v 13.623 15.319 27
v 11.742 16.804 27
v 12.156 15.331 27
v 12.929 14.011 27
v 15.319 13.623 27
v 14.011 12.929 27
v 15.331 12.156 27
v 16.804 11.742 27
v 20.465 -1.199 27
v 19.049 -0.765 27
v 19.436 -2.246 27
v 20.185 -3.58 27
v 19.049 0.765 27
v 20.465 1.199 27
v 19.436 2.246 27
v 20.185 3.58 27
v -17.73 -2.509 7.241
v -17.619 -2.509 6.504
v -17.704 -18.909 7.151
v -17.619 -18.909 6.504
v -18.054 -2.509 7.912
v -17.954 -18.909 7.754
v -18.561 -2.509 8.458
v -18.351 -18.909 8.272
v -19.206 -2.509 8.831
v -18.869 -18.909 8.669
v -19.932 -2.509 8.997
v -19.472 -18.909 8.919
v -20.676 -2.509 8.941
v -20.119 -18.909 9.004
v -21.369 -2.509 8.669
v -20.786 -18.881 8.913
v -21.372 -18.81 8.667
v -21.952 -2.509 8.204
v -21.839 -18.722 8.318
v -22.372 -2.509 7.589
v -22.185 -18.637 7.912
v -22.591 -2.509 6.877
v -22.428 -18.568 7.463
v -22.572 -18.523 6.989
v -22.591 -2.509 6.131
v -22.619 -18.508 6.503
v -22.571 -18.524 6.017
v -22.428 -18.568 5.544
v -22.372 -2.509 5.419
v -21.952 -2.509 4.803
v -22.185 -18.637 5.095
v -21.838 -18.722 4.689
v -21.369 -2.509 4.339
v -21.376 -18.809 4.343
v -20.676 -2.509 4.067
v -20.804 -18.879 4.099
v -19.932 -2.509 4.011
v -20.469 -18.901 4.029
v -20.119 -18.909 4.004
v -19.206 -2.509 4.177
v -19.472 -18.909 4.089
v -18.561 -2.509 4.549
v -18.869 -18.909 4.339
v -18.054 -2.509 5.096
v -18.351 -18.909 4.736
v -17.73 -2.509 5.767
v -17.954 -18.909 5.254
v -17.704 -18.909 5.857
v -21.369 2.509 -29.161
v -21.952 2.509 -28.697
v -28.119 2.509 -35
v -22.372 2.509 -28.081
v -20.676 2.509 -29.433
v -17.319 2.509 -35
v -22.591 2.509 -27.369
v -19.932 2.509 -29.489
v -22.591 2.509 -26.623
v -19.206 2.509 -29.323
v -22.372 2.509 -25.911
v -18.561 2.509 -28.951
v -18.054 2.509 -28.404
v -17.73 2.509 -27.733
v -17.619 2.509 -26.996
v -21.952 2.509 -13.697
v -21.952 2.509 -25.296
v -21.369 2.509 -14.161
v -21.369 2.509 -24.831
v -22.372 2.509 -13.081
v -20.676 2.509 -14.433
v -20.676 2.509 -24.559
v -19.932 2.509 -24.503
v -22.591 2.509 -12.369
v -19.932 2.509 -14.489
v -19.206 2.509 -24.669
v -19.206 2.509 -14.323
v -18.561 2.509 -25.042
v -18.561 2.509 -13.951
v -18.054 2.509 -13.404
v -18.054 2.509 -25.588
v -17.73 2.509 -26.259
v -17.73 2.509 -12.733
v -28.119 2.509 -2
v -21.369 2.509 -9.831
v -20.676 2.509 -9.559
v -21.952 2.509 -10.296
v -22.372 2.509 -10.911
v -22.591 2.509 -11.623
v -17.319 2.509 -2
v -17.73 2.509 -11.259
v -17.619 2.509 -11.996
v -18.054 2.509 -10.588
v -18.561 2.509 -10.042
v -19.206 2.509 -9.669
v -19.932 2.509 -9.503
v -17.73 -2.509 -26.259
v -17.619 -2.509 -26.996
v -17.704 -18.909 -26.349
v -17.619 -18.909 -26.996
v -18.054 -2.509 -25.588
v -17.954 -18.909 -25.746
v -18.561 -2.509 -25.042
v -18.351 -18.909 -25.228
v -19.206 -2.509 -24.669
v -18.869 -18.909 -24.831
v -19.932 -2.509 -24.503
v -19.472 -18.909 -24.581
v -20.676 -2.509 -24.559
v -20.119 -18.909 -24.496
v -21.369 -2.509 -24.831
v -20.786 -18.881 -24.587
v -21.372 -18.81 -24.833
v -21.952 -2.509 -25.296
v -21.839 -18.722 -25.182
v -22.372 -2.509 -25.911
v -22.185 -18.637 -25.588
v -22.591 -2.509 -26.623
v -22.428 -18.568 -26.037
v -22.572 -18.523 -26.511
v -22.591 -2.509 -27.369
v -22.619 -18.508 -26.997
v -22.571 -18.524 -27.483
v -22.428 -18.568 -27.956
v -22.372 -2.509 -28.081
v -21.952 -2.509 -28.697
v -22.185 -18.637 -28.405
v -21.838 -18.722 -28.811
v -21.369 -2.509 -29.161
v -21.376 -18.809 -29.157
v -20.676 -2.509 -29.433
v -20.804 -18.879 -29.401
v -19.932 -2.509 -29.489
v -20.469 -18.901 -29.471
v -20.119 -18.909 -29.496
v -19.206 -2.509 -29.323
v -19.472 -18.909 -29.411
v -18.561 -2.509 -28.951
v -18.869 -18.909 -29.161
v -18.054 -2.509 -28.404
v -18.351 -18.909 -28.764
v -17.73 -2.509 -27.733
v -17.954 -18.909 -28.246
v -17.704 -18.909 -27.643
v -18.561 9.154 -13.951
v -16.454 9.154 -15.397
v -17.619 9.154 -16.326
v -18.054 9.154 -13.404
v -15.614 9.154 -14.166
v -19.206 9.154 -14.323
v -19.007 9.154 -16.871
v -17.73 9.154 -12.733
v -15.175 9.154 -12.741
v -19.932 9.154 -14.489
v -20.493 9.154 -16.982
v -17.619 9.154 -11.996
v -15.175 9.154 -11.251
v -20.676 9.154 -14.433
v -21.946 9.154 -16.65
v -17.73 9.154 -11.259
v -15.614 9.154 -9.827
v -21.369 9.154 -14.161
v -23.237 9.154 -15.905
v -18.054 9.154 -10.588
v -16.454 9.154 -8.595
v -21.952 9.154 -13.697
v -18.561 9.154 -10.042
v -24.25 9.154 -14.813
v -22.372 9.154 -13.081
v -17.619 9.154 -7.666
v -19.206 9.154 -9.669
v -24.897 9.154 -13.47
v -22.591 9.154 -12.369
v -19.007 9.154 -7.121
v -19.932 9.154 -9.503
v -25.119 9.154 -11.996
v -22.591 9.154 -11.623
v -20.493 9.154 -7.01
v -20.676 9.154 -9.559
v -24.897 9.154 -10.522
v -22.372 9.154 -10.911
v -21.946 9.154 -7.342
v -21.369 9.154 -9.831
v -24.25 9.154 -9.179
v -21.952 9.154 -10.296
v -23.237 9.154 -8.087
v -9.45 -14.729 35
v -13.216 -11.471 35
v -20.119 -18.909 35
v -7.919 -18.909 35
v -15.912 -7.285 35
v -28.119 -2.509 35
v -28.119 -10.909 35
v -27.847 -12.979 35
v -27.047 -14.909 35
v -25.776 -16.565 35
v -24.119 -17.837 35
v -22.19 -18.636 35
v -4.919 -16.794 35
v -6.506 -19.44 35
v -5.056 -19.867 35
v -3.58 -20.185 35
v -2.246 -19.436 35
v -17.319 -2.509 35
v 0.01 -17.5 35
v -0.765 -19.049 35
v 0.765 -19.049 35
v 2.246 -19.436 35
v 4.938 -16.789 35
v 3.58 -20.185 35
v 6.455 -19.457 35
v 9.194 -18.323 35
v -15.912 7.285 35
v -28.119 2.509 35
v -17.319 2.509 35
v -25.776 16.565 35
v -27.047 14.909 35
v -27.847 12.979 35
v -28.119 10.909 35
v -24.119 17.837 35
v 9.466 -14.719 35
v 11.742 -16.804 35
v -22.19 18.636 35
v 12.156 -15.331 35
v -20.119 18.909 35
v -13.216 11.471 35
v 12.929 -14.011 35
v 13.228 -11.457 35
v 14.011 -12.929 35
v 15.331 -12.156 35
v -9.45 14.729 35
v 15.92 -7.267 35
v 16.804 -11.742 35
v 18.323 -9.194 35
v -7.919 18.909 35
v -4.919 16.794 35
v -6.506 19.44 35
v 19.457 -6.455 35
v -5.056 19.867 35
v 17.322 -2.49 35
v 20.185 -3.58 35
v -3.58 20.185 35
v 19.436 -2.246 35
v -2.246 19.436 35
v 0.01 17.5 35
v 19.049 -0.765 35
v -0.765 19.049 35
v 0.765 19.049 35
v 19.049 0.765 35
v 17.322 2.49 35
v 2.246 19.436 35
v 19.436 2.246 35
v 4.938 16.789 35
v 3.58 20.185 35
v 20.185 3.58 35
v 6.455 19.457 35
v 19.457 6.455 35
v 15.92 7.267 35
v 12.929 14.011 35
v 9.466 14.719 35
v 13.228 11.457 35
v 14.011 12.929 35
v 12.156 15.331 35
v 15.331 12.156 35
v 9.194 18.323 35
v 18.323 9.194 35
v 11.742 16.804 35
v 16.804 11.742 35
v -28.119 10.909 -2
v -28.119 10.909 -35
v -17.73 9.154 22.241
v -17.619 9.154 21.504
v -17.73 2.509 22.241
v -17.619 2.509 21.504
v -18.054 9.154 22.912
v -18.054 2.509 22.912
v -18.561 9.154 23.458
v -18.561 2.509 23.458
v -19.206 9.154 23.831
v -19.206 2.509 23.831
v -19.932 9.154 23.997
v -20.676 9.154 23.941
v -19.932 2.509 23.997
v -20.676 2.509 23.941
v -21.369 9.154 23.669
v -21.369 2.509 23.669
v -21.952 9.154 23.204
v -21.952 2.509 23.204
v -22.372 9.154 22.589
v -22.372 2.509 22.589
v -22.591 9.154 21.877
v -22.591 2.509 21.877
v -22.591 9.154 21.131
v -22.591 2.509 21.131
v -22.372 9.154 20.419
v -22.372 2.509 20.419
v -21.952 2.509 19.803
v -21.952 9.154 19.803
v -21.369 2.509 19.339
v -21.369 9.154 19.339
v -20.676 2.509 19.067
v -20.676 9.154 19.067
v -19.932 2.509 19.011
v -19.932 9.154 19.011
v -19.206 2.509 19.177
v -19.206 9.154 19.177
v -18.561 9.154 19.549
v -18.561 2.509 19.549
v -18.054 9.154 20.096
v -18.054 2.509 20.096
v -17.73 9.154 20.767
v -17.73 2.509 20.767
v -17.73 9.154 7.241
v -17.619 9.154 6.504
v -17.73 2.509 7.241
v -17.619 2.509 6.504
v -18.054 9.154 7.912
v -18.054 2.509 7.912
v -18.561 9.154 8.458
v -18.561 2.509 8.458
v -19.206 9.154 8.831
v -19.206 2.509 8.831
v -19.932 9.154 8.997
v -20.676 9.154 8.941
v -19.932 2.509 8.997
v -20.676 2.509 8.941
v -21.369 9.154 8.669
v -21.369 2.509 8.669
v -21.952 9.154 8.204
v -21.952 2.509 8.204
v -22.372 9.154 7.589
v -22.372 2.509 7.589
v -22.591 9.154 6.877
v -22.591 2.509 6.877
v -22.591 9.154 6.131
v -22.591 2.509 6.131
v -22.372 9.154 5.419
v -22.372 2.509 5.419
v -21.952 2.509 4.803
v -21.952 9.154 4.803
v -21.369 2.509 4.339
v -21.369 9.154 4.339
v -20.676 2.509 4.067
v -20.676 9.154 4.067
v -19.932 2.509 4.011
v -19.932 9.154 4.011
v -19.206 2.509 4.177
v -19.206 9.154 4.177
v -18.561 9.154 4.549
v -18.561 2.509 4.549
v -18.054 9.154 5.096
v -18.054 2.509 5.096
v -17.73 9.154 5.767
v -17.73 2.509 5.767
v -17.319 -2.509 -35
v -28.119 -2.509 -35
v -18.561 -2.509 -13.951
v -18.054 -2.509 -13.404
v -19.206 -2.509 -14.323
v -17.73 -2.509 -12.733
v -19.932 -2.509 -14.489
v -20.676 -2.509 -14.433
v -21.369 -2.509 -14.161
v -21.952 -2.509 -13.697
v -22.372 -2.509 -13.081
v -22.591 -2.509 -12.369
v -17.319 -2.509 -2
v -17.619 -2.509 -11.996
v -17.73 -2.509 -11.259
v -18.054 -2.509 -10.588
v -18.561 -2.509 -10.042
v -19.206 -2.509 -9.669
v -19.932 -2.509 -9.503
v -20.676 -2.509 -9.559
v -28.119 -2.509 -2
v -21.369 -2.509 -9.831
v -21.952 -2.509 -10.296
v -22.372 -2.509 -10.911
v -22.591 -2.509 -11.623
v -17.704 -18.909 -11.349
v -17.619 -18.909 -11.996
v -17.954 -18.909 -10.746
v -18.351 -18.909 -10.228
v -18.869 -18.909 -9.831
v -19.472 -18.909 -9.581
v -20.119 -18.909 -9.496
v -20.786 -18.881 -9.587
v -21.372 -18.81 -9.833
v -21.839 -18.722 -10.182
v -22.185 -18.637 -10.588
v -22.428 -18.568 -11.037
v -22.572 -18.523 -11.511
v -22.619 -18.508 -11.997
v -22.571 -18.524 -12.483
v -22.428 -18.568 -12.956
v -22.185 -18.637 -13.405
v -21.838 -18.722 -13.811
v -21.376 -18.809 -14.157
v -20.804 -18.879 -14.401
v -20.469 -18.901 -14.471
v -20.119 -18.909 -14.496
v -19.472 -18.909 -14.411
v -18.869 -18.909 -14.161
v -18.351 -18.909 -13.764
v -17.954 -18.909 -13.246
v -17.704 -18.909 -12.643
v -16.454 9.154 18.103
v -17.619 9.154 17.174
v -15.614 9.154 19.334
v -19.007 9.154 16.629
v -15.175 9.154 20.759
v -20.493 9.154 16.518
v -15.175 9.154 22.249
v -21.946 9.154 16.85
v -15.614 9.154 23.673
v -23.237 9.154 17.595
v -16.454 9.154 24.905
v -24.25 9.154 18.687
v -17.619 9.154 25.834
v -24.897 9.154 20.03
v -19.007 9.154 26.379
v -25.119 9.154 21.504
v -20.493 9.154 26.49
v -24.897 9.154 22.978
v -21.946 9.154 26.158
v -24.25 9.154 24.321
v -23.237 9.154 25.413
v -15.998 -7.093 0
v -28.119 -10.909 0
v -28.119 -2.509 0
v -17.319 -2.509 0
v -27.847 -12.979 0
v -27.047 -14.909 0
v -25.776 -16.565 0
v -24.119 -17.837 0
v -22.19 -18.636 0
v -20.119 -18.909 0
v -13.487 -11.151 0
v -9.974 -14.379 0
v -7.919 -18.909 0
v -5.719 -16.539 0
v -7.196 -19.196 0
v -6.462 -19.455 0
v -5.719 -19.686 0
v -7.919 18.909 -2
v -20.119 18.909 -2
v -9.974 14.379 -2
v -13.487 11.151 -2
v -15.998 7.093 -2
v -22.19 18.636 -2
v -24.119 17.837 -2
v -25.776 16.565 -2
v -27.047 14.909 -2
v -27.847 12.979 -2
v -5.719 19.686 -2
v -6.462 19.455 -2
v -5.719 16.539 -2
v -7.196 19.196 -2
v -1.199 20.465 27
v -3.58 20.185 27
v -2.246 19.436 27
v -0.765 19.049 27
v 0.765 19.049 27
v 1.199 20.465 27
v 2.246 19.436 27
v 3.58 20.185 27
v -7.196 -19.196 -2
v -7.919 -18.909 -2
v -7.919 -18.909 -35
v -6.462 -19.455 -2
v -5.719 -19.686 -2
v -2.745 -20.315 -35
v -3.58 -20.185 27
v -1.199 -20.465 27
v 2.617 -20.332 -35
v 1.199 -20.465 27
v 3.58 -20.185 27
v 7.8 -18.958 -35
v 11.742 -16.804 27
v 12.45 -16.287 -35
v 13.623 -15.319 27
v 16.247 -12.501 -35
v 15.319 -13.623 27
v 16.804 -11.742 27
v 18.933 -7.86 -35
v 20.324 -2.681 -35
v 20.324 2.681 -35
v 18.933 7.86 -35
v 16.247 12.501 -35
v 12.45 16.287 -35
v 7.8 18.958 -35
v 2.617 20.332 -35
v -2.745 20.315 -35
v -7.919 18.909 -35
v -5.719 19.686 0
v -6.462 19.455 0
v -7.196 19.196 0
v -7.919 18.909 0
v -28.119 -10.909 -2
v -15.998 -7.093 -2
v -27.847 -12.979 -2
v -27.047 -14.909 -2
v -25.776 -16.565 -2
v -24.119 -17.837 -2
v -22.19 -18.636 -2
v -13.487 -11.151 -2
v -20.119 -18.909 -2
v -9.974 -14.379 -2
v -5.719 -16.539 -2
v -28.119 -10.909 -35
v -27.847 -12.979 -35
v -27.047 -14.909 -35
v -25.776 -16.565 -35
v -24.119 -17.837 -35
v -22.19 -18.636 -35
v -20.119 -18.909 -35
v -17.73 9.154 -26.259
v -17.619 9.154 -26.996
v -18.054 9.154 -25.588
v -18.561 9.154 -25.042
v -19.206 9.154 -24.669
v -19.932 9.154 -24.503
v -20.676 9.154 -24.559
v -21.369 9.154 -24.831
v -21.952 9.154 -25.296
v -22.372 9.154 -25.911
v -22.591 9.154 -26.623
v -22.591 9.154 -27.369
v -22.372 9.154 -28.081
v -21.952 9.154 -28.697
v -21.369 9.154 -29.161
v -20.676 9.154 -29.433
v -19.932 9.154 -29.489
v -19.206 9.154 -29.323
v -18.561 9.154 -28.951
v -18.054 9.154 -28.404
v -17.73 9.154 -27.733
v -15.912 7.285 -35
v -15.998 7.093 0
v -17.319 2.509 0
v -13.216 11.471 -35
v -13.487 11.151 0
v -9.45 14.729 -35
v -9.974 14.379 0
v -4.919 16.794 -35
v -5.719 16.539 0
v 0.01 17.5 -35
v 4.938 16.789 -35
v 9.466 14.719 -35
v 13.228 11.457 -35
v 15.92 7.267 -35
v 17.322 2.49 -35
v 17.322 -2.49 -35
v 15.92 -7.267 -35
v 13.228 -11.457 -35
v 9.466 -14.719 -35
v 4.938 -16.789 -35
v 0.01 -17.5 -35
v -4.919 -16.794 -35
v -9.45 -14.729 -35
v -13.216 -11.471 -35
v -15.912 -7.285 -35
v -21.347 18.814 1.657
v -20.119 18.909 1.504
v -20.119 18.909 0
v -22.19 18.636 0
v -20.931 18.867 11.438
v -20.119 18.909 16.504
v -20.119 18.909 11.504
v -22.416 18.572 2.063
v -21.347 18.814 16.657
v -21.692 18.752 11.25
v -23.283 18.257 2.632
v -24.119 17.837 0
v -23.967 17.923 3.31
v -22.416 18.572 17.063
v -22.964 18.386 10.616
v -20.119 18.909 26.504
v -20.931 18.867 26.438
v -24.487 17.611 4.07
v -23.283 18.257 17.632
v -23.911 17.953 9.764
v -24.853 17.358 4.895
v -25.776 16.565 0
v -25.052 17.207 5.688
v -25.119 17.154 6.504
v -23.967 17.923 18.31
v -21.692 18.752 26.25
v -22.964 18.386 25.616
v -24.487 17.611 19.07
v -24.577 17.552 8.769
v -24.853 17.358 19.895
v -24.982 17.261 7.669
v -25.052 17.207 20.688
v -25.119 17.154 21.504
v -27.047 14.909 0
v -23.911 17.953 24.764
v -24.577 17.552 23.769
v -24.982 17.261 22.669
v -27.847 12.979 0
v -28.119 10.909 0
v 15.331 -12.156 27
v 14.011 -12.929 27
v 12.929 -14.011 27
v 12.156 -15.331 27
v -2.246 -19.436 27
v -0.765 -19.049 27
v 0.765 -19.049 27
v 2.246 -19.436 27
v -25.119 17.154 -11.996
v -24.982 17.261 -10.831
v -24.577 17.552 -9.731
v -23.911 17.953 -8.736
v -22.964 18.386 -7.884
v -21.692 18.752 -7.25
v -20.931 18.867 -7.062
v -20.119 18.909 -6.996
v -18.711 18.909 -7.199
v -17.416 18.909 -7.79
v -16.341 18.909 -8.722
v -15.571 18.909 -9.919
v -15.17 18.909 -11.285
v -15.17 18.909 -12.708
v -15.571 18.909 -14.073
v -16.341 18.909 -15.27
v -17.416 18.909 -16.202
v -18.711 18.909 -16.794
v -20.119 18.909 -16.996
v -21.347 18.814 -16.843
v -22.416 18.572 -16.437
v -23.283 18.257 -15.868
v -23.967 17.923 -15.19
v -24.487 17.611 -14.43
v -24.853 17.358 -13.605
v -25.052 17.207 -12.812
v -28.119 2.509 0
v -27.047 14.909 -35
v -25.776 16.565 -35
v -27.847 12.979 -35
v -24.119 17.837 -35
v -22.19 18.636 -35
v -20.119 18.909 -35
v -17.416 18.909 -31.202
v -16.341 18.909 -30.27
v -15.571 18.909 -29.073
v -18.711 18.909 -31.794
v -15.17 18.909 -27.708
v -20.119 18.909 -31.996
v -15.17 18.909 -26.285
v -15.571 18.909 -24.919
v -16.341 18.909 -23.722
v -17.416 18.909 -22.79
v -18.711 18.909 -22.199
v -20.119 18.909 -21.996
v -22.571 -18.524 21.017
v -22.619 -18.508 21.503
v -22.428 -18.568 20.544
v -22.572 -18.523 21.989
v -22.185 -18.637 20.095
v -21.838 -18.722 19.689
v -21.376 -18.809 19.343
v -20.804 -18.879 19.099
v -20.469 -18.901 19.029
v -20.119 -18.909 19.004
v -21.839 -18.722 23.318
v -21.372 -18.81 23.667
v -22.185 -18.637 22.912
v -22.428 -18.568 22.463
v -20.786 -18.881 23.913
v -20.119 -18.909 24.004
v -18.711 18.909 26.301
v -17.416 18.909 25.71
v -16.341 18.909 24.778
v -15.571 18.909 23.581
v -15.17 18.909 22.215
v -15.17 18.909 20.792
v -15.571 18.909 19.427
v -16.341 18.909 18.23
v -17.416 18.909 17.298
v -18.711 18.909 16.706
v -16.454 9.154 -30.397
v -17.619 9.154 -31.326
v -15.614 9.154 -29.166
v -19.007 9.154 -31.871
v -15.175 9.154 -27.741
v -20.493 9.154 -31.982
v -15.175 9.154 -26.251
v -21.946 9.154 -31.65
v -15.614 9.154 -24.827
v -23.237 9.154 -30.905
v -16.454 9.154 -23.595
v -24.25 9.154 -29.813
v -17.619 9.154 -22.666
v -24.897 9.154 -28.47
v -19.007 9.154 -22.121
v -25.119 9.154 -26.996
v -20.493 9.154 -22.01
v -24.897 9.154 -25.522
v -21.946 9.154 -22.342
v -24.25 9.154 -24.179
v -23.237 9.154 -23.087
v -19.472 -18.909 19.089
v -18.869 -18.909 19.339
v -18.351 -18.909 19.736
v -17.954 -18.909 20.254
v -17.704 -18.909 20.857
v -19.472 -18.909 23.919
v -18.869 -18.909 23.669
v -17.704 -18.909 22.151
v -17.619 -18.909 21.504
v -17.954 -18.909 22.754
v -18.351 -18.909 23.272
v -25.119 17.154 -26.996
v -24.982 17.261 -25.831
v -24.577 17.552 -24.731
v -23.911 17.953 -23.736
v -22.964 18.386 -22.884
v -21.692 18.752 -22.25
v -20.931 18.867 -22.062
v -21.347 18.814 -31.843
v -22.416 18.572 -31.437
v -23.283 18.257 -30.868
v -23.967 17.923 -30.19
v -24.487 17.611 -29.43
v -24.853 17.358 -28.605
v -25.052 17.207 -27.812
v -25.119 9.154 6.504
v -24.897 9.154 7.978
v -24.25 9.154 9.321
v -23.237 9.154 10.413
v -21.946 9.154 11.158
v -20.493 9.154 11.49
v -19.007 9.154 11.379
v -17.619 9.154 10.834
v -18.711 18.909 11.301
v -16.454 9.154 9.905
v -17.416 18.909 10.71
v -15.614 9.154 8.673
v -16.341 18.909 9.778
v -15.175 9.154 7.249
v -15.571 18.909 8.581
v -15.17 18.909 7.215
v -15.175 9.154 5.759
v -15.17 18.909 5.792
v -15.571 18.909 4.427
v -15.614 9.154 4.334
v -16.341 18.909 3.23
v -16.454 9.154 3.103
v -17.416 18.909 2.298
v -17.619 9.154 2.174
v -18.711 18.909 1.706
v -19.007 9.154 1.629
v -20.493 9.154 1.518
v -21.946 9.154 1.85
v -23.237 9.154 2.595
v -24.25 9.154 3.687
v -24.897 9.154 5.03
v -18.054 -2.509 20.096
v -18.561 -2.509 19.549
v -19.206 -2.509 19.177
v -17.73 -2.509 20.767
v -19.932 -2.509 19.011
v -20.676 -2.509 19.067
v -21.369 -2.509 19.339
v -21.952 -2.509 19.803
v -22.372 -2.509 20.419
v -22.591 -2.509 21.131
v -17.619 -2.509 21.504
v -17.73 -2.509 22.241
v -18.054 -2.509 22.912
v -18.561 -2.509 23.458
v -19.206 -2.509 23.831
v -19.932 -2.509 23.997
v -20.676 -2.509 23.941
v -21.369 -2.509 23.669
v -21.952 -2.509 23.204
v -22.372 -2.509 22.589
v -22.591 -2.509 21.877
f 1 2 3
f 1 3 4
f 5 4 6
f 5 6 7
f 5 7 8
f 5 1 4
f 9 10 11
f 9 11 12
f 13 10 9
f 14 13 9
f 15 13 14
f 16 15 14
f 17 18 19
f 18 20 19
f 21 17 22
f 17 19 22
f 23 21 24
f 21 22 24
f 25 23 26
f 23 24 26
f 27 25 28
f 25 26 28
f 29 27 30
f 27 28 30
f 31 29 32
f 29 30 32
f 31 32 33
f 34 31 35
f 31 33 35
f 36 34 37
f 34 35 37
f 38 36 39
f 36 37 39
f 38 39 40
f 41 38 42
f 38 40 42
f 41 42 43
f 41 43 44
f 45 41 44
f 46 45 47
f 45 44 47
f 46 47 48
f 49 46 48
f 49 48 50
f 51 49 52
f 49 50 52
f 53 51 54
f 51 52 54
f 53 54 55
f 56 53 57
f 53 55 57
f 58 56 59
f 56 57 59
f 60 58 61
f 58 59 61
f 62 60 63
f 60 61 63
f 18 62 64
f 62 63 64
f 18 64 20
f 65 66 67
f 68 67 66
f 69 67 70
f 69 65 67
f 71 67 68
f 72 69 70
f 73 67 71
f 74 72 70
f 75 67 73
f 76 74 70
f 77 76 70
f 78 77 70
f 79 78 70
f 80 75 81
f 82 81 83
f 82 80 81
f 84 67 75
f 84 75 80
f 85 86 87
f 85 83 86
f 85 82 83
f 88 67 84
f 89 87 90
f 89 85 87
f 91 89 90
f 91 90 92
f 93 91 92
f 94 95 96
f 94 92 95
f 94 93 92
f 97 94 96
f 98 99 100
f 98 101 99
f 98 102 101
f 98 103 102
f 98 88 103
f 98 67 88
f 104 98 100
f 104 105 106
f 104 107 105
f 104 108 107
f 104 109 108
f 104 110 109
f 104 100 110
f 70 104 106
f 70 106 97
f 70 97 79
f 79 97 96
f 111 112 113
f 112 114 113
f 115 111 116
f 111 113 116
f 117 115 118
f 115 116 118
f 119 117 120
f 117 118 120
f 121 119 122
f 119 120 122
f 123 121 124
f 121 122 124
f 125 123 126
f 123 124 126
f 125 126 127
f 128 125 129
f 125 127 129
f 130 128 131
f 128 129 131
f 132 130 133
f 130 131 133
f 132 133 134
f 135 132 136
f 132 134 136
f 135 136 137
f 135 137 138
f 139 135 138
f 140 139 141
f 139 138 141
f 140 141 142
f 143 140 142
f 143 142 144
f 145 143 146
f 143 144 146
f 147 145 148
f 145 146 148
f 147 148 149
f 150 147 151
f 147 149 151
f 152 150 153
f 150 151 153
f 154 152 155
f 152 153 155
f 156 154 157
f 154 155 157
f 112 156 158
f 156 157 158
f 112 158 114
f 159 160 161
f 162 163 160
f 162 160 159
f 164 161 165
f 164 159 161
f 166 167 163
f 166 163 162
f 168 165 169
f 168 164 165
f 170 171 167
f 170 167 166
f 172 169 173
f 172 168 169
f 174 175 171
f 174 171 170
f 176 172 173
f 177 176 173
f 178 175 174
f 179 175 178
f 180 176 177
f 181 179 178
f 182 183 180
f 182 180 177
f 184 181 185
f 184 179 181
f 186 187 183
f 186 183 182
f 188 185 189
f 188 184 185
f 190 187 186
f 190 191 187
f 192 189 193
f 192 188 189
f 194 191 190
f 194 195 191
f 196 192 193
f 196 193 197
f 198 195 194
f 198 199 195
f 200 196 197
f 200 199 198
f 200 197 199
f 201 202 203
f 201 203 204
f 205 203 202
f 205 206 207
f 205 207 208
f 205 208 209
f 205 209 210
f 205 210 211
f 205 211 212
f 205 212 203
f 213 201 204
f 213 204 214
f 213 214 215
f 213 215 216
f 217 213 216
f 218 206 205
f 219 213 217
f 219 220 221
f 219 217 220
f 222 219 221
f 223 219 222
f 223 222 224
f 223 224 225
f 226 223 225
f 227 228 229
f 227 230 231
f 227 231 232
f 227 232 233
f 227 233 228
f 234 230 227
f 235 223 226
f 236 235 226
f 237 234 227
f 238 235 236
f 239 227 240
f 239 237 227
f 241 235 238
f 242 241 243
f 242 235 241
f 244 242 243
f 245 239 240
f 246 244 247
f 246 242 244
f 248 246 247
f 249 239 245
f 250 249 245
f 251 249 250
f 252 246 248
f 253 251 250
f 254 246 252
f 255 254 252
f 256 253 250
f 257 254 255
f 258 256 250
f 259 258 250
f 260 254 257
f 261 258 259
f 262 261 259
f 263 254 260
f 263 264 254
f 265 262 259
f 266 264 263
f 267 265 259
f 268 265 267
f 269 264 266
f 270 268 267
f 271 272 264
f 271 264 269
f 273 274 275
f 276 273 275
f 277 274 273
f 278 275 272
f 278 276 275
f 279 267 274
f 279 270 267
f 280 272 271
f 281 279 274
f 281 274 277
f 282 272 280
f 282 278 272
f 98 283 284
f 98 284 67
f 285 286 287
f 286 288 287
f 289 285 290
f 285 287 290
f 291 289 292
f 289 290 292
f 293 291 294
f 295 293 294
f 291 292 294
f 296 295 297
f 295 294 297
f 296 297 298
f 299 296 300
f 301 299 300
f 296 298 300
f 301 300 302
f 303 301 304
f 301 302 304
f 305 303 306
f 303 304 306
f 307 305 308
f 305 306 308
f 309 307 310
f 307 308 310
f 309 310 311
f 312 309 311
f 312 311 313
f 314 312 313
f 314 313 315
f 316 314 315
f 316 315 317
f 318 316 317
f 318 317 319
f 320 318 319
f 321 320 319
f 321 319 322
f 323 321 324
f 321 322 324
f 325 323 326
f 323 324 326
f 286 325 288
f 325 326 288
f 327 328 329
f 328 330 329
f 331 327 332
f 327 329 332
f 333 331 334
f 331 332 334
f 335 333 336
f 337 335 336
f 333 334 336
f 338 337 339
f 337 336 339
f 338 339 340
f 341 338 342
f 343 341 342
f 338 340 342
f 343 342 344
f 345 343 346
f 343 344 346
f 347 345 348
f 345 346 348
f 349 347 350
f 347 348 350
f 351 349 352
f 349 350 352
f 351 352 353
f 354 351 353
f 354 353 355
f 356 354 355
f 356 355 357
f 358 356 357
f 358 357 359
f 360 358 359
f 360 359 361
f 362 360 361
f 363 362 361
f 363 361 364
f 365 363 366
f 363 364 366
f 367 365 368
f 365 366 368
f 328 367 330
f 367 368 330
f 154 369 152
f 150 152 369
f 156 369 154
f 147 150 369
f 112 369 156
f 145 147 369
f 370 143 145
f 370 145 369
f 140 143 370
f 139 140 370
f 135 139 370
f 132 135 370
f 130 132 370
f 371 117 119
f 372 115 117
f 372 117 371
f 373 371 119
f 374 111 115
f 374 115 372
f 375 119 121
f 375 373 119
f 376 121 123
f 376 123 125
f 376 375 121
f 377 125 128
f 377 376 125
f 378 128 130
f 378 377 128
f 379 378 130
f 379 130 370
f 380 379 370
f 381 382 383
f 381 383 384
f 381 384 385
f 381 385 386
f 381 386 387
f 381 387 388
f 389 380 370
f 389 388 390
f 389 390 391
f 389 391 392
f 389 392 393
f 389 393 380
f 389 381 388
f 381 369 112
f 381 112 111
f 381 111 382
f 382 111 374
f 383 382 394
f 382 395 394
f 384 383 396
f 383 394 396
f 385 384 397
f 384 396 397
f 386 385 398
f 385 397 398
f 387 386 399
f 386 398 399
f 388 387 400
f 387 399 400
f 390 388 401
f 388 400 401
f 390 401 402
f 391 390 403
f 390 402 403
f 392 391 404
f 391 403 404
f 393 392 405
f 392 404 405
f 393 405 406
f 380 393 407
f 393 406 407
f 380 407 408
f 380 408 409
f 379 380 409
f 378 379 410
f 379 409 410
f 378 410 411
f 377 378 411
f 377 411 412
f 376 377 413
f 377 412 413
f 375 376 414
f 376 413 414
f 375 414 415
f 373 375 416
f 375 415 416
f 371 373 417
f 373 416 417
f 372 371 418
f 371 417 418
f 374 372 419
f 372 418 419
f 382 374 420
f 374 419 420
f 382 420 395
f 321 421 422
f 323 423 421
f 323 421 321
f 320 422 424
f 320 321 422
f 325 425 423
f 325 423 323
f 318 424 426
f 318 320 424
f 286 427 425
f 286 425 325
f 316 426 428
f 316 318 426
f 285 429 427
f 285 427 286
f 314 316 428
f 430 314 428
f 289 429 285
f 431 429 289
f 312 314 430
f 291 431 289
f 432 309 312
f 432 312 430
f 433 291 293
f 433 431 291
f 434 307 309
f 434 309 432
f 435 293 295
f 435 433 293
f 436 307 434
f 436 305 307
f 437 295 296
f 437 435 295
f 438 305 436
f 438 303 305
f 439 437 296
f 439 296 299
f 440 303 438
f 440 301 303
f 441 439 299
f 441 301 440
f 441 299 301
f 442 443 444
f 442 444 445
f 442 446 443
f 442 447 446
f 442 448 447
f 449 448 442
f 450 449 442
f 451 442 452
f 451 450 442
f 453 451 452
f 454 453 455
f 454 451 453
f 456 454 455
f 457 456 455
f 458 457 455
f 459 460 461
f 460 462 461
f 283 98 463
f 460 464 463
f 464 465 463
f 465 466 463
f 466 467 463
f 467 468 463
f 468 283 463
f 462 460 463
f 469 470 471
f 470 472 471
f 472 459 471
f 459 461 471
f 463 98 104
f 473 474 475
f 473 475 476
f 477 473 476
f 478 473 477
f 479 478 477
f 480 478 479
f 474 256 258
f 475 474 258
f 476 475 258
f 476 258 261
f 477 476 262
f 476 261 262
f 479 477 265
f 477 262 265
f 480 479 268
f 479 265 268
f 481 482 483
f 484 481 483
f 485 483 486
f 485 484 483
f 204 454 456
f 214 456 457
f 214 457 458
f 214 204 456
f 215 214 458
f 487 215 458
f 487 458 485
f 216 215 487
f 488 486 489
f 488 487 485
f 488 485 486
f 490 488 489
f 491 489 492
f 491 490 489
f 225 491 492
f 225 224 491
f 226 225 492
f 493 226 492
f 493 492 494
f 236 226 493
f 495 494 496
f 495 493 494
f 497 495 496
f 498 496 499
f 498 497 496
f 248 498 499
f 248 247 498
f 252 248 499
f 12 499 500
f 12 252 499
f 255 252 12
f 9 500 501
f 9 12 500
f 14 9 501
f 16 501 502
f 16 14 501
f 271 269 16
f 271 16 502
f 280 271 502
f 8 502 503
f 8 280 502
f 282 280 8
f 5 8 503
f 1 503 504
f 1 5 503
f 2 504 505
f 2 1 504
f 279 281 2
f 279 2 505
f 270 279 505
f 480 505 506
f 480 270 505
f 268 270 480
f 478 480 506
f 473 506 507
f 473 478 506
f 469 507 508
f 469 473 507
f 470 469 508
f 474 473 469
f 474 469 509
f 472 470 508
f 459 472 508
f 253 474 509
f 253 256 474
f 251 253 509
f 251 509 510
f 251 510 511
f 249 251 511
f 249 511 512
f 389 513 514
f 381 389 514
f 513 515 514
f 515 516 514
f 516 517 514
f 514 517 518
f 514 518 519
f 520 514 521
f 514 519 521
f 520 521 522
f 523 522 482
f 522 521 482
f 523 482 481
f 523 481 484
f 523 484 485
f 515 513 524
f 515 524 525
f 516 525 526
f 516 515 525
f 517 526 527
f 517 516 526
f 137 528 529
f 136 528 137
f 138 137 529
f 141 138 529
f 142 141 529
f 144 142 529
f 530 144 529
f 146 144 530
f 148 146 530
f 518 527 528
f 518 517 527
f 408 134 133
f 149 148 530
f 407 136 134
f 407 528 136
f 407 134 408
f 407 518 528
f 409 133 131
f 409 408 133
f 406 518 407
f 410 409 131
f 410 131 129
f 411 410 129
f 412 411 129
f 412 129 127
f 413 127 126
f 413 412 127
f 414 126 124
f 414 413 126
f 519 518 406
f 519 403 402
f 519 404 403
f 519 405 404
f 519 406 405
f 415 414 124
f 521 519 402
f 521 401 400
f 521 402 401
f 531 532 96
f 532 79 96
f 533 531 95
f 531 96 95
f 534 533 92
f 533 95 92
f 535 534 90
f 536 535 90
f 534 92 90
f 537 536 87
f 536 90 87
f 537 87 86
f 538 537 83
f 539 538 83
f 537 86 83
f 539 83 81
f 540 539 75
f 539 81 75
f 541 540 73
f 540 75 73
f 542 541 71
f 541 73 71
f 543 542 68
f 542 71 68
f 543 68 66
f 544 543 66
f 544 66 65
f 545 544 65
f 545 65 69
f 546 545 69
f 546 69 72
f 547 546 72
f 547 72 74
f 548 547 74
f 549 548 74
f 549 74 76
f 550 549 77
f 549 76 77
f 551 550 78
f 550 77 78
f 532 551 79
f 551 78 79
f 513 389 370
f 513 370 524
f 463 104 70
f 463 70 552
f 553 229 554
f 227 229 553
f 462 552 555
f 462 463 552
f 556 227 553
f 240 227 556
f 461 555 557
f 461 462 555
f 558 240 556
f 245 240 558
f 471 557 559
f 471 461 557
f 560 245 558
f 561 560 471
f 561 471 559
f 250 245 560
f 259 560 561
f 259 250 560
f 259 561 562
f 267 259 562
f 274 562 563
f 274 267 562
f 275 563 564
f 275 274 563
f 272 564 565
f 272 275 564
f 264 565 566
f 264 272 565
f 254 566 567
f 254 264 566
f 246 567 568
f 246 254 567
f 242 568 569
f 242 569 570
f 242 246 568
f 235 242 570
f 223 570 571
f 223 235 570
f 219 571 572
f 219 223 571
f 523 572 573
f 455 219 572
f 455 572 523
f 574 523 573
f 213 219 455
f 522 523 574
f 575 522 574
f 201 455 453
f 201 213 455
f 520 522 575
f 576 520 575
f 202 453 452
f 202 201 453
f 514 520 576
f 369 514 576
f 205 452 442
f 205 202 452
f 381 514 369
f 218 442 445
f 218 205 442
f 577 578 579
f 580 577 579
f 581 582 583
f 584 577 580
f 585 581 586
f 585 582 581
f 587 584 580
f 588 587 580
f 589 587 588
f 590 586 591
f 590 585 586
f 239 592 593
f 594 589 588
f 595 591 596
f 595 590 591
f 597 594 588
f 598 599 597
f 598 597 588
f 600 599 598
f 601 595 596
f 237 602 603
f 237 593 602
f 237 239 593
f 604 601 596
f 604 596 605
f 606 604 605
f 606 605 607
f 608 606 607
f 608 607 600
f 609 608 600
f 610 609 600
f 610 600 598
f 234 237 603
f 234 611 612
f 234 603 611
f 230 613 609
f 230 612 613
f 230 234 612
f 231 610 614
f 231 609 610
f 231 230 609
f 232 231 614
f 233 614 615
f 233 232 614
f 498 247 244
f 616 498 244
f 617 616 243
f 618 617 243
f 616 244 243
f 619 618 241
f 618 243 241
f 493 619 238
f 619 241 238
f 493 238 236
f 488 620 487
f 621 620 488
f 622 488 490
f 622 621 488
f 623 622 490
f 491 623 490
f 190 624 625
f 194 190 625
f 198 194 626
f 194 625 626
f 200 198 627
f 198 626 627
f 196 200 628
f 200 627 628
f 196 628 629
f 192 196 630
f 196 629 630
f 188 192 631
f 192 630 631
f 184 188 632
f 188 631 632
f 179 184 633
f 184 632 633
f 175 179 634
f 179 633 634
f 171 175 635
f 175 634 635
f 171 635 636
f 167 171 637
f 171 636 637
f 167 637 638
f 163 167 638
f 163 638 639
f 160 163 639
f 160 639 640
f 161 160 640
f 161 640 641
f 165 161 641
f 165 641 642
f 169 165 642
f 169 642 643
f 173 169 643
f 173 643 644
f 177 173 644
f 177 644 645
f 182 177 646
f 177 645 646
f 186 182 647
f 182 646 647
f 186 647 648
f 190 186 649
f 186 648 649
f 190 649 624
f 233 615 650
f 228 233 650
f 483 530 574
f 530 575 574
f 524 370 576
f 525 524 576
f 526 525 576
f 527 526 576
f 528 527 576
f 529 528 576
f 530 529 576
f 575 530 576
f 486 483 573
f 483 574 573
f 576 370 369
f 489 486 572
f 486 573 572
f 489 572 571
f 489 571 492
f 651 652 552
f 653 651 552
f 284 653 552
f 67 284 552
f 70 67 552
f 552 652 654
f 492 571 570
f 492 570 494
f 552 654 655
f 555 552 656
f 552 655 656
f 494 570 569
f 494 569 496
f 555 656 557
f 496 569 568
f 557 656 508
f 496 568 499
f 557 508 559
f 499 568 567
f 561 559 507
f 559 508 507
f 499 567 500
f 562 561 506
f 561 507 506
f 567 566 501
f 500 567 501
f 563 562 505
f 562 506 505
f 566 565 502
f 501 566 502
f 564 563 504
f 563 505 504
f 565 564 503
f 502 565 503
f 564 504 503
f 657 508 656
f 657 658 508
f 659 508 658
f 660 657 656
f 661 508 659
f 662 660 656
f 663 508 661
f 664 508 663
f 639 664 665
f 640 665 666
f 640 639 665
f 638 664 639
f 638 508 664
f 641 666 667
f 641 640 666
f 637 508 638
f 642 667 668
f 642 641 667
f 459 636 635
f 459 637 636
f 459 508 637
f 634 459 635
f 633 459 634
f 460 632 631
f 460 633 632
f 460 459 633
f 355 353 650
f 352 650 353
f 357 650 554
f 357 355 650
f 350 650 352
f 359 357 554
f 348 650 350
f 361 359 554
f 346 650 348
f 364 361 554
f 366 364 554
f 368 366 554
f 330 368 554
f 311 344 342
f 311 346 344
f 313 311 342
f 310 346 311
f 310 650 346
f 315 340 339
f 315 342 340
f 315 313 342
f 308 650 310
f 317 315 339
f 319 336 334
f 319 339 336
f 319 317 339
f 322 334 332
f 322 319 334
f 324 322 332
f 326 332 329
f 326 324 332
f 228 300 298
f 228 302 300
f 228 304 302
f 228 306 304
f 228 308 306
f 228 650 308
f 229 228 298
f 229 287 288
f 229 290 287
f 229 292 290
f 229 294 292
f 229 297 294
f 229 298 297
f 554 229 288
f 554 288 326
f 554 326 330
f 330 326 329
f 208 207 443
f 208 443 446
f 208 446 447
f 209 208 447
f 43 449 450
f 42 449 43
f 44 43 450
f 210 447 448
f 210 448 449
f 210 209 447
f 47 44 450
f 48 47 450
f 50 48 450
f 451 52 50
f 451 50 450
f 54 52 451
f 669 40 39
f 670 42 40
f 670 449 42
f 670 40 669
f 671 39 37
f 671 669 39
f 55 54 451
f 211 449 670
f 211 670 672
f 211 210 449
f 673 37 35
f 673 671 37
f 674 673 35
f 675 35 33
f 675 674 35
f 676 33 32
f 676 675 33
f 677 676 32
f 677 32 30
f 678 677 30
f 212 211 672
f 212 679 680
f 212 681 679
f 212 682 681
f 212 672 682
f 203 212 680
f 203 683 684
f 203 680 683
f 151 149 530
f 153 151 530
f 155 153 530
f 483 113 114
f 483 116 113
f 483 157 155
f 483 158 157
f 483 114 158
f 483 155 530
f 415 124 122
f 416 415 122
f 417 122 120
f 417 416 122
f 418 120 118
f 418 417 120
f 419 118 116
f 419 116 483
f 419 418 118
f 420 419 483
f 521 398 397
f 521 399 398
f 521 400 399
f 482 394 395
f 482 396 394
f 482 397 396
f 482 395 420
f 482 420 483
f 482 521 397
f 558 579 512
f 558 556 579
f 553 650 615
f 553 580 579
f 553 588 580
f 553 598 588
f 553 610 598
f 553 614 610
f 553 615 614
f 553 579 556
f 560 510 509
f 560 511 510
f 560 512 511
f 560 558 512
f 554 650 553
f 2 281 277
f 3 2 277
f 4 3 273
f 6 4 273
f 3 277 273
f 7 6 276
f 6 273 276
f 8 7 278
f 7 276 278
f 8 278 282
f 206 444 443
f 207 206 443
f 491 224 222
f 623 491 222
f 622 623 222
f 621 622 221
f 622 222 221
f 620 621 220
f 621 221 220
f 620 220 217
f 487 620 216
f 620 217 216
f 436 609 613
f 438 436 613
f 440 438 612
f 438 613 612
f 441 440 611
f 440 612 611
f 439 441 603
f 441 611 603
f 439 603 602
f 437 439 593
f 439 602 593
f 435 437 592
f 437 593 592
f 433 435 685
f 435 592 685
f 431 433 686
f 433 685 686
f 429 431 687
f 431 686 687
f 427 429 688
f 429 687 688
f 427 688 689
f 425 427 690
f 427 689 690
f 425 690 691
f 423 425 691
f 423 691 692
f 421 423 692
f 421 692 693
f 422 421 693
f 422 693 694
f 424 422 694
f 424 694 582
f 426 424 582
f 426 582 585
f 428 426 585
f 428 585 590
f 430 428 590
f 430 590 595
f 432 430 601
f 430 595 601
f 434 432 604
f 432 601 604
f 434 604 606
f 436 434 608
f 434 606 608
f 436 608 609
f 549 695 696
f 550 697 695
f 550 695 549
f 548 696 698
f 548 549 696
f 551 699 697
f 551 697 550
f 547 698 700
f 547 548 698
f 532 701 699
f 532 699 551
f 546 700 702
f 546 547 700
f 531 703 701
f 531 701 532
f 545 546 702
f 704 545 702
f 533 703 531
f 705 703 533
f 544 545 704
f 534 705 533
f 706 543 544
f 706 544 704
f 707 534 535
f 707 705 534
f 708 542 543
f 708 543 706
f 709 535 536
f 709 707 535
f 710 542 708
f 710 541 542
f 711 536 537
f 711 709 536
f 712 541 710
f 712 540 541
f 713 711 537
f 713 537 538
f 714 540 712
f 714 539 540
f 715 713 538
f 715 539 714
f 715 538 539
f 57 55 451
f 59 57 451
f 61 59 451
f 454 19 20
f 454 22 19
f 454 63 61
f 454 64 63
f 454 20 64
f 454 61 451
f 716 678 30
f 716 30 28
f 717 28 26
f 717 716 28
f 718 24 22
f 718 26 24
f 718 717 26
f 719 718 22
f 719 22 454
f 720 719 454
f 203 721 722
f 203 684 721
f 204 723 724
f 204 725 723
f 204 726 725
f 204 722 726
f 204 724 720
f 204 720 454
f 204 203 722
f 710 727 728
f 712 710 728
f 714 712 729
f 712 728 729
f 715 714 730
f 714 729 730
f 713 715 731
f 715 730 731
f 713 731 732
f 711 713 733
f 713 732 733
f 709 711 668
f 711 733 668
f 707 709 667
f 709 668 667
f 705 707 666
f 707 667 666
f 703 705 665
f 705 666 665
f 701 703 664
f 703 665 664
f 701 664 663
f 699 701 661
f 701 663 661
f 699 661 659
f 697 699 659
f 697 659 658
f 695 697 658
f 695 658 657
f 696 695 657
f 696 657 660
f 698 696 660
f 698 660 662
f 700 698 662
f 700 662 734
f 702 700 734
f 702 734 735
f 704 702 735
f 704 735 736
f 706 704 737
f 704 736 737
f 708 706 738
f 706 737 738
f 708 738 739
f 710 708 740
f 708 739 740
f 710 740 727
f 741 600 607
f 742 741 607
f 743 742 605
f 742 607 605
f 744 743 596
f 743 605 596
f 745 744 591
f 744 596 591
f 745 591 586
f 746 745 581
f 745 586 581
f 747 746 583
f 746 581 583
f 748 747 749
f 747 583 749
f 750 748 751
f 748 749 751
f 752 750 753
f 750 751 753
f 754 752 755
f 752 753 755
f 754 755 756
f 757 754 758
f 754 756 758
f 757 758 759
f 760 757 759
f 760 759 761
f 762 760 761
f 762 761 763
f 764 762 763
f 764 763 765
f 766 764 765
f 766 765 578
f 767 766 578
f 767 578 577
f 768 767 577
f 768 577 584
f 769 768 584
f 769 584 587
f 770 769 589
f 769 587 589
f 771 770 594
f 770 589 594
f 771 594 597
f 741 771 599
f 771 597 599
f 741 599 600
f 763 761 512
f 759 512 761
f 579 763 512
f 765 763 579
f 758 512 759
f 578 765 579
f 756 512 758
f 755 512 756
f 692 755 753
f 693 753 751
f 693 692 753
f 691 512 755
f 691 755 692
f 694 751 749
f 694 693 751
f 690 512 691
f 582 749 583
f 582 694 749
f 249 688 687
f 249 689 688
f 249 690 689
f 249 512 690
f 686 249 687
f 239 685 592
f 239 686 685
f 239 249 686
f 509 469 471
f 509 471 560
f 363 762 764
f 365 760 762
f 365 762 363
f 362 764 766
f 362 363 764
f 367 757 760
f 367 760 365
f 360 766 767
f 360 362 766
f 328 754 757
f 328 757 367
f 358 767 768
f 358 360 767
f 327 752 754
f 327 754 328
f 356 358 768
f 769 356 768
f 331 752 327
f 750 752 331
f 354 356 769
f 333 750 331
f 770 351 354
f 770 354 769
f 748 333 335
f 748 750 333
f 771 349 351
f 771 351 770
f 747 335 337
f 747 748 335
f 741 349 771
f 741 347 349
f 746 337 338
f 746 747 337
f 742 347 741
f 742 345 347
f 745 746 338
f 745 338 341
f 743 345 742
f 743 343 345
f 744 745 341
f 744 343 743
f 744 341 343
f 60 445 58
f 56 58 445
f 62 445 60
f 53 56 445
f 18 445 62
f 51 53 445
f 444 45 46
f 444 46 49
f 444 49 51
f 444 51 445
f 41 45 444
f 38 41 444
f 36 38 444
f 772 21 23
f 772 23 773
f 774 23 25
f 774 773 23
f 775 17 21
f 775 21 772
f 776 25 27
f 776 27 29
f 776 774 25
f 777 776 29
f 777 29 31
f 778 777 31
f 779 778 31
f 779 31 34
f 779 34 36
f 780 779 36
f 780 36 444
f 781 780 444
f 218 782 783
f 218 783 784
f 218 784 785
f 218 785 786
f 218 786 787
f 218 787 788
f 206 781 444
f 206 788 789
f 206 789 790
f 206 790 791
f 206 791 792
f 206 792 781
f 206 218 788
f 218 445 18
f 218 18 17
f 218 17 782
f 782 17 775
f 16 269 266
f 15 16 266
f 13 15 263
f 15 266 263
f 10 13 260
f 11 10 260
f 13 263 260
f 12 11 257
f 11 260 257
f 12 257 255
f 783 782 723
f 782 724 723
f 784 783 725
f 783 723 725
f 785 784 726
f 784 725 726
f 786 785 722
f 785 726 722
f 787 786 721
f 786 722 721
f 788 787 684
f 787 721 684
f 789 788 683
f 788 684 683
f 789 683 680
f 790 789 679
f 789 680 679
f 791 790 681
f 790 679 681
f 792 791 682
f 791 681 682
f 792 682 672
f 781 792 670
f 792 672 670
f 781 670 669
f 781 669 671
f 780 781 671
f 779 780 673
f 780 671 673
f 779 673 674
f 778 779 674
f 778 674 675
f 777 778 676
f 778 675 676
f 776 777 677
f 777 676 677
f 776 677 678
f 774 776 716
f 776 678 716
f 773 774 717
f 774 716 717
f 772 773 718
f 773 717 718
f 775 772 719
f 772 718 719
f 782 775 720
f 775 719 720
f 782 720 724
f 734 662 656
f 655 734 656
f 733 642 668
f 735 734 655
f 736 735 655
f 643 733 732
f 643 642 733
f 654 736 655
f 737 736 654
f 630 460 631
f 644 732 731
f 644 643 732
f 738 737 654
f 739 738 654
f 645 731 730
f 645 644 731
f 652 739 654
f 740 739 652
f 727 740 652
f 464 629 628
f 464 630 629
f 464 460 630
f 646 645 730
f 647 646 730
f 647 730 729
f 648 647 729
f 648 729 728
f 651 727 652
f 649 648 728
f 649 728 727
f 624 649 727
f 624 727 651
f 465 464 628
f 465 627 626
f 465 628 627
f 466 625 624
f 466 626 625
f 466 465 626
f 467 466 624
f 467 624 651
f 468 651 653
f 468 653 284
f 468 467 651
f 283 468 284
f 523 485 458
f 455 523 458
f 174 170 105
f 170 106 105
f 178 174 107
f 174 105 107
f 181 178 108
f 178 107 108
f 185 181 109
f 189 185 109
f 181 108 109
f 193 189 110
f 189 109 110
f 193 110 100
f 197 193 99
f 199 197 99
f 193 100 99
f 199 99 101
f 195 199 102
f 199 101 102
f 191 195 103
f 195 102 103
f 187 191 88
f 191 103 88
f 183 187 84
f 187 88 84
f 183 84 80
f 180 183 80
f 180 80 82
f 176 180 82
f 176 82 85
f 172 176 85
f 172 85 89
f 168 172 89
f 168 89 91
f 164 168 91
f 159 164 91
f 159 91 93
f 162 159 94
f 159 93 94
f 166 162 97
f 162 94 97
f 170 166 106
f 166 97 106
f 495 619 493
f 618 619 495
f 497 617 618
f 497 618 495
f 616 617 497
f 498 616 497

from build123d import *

# Parameters (mm, degrees)
F1_DEPTH       = 35
F3_D           = 5
F3_START       = 1.7550021
F3_CBORE_D     = 10
F3_CBORE_DEPTH = 8
F5_W           = 22.4
F5_H           = 2
F6_DEPTH       = 25
F7_R           = 6
F8_DEPTH       = 8


with BuildPart() as f1:
    # F0 (on Top) → F1 (new body, symmetric)
    with BuildSketch(Plane.XY):
        with BuildLine():
            ThreePointArc((-17.3192642082, 2.5086026559), (17.5, 0), (-17.3192642082, -2.5086026559))
            Line((-17.3192642082, -2.5086026559), (-28.1192642082, -2.5086026559))
            Line((-28.1192642082, -2.5086026559), (-28.1192642082, -10.9086026559))
            ThreePointArc((-28.1192642082, -10.9086026559), (-25.7761184577, -16.5654569054), (-20.1192642082, -18.9086026559))
            Line((-20.1192642082, -18.9086026559), (-7.9192642082, -18.9086026559))
            ThreePointArc((-7.9192642082, -18.9086026559), (20.5, 0), (-7.9192642082, 18.9086026559))
            Line((-7.9192642082, 18.9086026559), (-20.1192642082, 18.9086026559))
            ThreePointArc((-20.1192642082, 18.9086026559), (-25.7761184577, 16.5654569054), (-28.1192642082, 10.9086026559))
            Line((-28.1192642082, 10.9086026559), (-28.1192642082, 2.5086026559))
            Line((-28.1192642082, 2.5086026559), (-17.3192642082, 2.5086026559))
        make_face()
    extrude(amount=F1_DEPTH, both=True)

    # F3 (through all)
    # its depths count from where the whole tool has entered the part; down to there all is cleared
    with Locations(Plane(origin=(0, 18.9086026559, 0), x_dir=(-1, 0, 0), z_dir=(0, 1, 0)).offset(-F3_START)):
        with Locations((20.1192642082, 21.5039052665), (20.1192642082, 6.5039052665), (20.1192642082, -26.9960947335), (20.1192642082, -11.9960947335)):
            CounterBoreHole(F3_D / 2, F3_CBORE_D / 2, F3_CBORE_DEPTH)

    # F5 (on Front) → F6 (cut, symmetric)
    with BuildSketch(Plane.XZ):
        with Locations((-16.9192642082, -1)):
            Rectangle(F5_W, F5_H)
    extrude(amount=F6_DEPTH, both=True, mode=Mode.SUBTRACT)

    # F7 (on face) → F8 (cut)
    with BuildSketch(Plane.XY.offset(35)):
        with Locations((0, -25)):
            Circle(F7_R)
        with Locations((17.6776695297, -17.6776695297)):
            Circle(F7_R)
        with Locations((25, 0)):
            Circle(F7_R)
        with Locations((17.6776695297, 17.6776695297)):
            Circle(F7_R)
        with Locations((0, 25)):
            Circle(F7_R)
    extrude(amount=-F8_DEPTH, mode=Mode.SUBTRACT)


solid = f1.part
